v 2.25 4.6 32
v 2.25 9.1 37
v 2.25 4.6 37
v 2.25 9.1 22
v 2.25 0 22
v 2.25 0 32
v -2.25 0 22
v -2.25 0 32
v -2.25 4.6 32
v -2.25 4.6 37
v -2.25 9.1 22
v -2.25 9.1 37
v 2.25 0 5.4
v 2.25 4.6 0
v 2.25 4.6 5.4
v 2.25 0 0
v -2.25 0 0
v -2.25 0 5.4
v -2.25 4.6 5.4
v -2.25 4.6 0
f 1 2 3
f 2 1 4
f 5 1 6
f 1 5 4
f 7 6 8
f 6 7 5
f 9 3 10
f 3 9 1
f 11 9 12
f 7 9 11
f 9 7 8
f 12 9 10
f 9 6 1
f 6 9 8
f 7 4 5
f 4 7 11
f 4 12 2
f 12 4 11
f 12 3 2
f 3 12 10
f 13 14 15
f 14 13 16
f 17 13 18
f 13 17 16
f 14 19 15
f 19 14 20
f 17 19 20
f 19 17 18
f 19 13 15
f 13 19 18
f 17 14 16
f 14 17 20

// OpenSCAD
module skadis_base() {
    translate([-4.5/2, 4.6, 22]) rotate([90, 0, 0]) union() {
        cube([4.5, 10, 4.6]);
        translate([0, 0, -4.5]) cube([4.5, 15, 4.5]);
        translate([0, -22, 0]) cube([4.5, 5.4, 4.6]);
    }
}

function SKADIS_HINGE_CENTER() = 5+(22/2);
function SKADIS_TOTAL_HEIGHT() = 22+5+10;
function SKADIS_TOTAL_DEPTH() = 5+4.5;

skadis_base();
